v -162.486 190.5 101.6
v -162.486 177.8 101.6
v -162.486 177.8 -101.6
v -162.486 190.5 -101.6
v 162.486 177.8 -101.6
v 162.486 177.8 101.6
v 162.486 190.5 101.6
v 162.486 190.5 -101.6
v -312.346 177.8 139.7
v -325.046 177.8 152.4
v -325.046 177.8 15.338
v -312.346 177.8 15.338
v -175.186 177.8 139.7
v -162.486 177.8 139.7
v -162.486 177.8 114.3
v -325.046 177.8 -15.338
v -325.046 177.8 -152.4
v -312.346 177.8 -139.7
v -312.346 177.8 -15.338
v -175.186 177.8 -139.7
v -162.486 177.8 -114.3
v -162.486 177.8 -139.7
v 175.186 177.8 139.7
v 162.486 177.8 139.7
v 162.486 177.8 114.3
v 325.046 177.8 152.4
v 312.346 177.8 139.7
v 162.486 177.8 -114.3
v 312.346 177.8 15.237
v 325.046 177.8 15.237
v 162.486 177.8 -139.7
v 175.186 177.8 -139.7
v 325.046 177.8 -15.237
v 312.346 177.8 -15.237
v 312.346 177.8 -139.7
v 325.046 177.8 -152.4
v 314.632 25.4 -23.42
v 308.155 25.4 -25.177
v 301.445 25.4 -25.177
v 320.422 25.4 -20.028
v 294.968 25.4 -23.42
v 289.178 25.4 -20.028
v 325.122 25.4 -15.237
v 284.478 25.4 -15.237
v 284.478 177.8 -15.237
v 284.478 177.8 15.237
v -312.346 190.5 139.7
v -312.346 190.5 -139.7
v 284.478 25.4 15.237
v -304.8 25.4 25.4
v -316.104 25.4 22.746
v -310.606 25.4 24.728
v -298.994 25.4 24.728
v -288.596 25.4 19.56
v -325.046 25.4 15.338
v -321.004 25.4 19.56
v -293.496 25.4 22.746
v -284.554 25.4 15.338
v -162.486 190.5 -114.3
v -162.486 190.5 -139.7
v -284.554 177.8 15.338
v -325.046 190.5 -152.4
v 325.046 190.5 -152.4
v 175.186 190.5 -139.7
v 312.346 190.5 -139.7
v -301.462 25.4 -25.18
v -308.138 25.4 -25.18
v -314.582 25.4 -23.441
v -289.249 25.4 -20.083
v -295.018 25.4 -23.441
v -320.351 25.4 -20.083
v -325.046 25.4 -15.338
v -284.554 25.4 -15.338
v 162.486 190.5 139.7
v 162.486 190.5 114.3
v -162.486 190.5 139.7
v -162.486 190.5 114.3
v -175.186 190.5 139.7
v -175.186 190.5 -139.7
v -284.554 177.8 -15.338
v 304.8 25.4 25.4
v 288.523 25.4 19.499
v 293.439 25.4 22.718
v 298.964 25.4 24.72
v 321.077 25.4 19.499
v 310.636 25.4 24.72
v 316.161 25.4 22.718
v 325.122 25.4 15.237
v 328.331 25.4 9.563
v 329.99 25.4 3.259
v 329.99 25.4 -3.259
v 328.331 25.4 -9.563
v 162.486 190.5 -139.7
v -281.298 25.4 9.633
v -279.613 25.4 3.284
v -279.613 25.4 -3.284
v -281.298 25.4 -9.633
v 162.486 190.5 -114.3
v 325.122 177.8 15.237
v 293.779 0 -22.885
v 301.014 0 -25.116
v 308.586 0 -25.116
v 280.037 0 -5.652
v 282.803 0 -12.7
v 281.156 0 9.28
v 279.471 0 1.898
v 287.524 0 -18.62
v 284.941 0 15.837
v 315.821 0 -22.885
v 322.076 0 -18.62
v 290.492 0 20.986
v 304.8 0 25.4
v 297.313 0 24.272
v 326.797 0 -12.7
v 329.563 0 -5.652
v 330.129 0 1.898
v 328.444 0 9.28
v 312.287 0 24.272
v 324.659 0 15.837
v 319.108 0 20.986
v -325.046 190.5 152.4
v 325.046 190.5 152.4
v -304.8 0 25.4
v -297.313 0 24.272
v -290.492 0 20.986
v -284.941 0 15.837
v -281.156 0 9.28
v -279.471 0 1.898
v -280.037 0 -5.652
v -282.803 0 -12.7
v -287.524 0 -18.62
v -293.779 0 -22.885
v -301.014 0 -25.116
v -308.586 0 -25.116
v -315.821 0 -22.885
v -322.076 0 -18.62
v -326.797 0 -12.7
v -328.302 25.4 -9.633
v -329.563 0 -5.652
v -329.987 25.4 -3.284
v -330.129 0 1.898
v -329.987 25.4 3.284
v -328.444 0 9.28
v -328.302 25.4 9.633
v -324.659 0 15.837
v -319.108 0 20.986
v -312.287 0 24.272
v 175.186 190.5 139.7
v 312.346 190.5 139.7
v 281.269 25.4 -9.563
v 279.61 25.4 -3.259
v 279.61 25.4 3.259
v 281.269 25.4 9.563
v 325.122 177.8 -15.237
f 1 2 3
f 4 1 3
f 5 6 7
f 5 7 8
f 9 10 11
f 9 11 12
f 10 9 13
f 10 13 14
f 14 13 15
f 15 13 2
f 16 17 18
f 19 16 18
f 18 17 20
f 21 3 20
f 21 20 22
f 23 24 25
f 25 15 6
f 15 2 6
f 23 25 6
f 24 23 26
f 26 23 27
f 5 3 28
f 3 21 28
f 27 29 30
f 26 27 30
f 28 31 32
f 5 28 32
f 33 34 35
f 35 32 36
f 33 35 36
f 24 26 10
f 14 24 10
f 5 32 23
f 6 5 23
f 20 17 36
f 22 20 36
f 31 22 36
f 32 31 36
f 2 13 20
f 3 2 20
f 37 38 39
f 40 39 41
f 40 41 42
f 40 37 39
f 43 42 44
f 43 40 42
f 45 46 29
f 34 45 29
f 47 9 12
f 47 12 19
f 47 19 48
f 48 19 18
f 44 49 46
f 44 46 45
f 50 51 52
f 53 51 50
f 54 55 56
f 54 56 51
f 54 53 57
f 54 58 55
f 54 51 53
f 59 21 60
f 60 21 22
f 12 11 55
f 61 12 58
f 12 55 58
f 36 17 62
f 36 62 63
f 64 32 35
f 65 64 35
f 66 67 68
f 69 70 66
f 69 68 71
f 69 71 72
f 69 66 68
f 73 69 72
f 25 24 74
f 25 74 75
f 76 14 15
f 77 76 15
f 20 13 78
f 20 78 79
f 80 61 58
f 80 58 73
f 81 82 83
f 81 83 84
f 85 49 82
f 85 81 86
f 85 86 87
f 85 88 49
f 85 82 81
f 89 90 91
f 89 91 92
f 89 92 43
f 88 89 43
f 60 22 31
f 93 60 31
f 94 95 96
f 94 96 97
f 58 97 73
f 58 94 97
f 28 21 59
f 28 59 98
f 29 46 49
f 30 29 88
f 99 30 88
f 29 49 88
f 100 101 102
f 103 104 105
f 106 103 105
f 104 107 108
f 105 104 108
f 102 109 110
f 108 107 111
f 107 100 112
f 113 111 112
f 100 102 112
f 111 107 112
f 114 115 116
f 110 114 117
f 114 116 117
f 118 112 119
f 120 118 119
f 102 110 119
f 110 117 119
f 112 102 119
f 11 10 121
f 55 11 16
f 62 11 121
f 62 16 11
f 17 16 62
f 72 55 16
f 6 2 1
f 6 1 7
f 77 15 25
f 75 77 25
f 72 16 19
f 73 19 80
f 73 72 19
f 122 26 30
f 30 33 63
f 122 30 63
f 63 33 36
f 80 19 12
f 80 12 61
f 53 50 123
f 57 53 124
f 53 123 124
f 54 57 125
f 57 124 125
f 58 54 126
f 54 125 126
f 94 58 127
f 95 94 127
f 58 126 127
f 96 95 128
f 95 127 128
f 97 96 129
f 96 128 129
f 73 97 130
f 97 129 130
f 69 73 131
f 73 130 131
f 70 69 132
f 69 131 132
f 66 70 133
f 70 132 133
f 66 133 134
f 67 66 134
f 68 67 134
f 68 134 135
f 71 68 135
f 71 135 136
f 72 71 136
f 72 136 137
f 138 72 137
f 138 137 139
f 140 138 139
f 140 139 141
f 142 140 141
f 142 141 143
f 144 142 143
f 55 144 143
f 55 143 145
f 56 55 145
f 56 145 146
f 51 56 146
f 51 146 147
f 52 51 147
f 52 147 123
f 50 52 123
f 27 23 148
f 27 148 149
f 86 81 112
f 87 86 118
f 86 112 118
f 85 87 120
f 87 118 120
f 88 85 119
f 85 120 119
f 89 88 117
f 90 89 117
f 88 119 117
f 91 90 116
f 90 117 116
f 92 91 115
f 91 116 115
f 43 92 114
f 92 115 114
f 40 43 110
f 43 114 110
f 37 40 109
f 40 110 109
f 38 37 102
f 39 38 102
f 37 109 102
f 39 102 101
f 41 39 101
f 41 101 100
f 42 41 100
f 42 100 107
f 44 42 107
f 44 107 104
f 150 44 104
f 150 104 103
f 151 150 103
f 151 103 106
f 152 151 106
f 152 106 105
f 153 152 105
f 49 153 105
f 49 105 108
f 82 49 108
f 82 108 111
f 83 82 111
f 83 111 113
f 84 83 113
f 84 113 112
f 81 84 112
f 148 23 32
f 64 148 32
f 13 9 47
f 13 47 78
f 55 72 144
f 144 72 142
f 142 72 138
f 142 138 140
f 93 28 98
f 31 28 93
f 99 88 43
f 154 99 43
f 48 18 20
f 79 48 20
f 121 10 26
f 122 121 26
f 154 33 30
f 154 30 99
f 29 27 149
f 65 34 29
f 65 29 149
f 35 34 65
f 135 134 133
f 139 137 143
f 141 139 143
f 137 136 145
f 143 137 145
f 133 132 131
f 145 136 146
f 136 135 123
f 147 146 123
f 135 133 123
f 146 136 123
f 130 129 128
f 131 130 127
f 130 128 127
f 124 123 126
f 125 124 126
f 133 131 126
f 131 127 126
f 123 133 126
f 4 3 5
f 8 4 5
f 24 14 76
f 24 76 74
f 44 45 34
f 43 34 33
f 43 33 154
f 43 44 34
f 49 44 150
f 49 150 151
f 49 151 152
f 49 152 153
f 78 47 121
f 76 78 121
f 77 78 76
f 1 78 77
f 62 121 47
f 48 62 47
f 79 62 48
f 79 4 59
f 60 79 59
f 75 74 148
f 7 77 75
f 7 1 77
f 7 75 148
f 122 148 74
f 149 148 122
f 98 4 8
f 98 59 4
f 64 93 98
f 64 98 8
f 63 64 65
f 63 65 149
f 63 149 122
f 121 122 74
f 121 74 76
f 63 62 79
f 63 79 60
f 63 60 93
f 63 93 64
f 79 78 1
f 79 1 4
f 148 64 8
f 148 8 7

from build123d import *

# Parameters (mm, degrees)
SKETCH1_R             = 25.4
BOSS_EXTRUDE1_DEPTH   = 25.4
BOSS_EXTRUDE1_2_DEPTH = 25.4
SKETCH3_W             = 40.64380449
SKETCH3_H             = 30.474926688
BOSS_EXTRUDE2_DEPTH   = 152.4
SKETCH4_W             = 40.492338346
SKETCH4_H             = 30.67589502
BOSS_EXTRUDE3_DEPTH   = 152.4
SKETCH5_W             = 650.092338346
SKETCH5_H             = 304.8
SKETCH5_W_2           = 137.16
SKETCH5_H_2           = 279.4
SKETCH5_W_3           = 324.972338346
SKETCH5_H_3           = 25.4
SKETCH5_H_4           = 203.2
BOSS_EXTRUDE4_DEPTH   = 12.7


with BuildPart() as part:
    # Sketch1 → Boss-Extrude1 (new body)
    with BuildSketch(Plane(origin=(0, 0, 0), x_dir=(1, 0, 0), z_dir=(0, 1, 0))):
        with Locations(Location((304.8, 0, 0), (0, 0, 270))):
            Circle(SKETCH1_R)
    extrude(amount=BOSS_EXTRUDE1_DEPTH)

    # Sketch3 → Boss-Extrude2 (add)
    with BuildSketch(Plane(origin=(0, 25.4, 0), x_dir=(1, 0, 0), z_dir=(0, 1, 0))):
        with Locations((304.8, 0)):
            Rectangle(SKETCH3_W, SKETCH3_H)
    extrude(amount=BOSS_EXTRUDE2_DEPTH)



with BuildPart() as body_2:
    # Sketch1 → Boss-Extrude1 2 (new body)
    with BuildSketch(Plane(origin=(0, 0, 0), x_dir=(1, 0, 0), z_dir=(0, 1, 0))):
        with Locations(Location((-304.8, 0, 0), (0, 0, 270))):
            Circle(SKETCH1_R)
    extrude(amount=BOSS_EXTRUDE1_2_DEPTH)

    # Sketch4 → Boss-Extrude3 (add)
    with BuildSketch(Plane(origin=(0, 25.4, 0), x_dir=(1, 0, 0), z_dir=(0, 1, 0))):
        with Locations((-304.8, 0)):
            Rectangle(SKETCH4_W, SKETCH4_H)
    extrude(amount=BOSS_EXTRUDE3_DEPTH)


with BuildPart() as part_1:
    add(part.part)

    add(body_2.part)  # Boss-Extrude4 merges body 2
    # Sketch5 → Boss-Extrude4 (add)
    with BuildSketch(Plane(origin=(0, 177.8, 0), x_dir=(1, 0, 0), z_dir=(0, 1, 0))):
        Rectangle(SKETCH5_W, SKETCH5_H)
        with Locations((-243.766169173, 0)):
            Rectangle(SKETCH5_W_2, SKETCH5_H_2, mode=Mode.SUBTRACT)
        with Locations((243.766169173, 0)):
            Rectangle(SKETCH5_W_2, SKETCH5_H_2, mode=Mode.SUBTRACT)
        with Locations((0, 127)):
            Rectangle(SKETCH5_W_3, SKETCH5_H_3, mode=Mode.SUBTRACT)
        Rectangle(SKETCH5_W_3, SKETCH5_H_4, mode=Mode.SUBTRACT)
        with Locations((0, -127)):
            Rectangle(SKETCH5_W_3, SKETCH5_H_3, mode=Mode.SUBTRACT)
    extrude(amount=BOSS_EXTRUDE4_DEPTH)


solid = part_1.part
